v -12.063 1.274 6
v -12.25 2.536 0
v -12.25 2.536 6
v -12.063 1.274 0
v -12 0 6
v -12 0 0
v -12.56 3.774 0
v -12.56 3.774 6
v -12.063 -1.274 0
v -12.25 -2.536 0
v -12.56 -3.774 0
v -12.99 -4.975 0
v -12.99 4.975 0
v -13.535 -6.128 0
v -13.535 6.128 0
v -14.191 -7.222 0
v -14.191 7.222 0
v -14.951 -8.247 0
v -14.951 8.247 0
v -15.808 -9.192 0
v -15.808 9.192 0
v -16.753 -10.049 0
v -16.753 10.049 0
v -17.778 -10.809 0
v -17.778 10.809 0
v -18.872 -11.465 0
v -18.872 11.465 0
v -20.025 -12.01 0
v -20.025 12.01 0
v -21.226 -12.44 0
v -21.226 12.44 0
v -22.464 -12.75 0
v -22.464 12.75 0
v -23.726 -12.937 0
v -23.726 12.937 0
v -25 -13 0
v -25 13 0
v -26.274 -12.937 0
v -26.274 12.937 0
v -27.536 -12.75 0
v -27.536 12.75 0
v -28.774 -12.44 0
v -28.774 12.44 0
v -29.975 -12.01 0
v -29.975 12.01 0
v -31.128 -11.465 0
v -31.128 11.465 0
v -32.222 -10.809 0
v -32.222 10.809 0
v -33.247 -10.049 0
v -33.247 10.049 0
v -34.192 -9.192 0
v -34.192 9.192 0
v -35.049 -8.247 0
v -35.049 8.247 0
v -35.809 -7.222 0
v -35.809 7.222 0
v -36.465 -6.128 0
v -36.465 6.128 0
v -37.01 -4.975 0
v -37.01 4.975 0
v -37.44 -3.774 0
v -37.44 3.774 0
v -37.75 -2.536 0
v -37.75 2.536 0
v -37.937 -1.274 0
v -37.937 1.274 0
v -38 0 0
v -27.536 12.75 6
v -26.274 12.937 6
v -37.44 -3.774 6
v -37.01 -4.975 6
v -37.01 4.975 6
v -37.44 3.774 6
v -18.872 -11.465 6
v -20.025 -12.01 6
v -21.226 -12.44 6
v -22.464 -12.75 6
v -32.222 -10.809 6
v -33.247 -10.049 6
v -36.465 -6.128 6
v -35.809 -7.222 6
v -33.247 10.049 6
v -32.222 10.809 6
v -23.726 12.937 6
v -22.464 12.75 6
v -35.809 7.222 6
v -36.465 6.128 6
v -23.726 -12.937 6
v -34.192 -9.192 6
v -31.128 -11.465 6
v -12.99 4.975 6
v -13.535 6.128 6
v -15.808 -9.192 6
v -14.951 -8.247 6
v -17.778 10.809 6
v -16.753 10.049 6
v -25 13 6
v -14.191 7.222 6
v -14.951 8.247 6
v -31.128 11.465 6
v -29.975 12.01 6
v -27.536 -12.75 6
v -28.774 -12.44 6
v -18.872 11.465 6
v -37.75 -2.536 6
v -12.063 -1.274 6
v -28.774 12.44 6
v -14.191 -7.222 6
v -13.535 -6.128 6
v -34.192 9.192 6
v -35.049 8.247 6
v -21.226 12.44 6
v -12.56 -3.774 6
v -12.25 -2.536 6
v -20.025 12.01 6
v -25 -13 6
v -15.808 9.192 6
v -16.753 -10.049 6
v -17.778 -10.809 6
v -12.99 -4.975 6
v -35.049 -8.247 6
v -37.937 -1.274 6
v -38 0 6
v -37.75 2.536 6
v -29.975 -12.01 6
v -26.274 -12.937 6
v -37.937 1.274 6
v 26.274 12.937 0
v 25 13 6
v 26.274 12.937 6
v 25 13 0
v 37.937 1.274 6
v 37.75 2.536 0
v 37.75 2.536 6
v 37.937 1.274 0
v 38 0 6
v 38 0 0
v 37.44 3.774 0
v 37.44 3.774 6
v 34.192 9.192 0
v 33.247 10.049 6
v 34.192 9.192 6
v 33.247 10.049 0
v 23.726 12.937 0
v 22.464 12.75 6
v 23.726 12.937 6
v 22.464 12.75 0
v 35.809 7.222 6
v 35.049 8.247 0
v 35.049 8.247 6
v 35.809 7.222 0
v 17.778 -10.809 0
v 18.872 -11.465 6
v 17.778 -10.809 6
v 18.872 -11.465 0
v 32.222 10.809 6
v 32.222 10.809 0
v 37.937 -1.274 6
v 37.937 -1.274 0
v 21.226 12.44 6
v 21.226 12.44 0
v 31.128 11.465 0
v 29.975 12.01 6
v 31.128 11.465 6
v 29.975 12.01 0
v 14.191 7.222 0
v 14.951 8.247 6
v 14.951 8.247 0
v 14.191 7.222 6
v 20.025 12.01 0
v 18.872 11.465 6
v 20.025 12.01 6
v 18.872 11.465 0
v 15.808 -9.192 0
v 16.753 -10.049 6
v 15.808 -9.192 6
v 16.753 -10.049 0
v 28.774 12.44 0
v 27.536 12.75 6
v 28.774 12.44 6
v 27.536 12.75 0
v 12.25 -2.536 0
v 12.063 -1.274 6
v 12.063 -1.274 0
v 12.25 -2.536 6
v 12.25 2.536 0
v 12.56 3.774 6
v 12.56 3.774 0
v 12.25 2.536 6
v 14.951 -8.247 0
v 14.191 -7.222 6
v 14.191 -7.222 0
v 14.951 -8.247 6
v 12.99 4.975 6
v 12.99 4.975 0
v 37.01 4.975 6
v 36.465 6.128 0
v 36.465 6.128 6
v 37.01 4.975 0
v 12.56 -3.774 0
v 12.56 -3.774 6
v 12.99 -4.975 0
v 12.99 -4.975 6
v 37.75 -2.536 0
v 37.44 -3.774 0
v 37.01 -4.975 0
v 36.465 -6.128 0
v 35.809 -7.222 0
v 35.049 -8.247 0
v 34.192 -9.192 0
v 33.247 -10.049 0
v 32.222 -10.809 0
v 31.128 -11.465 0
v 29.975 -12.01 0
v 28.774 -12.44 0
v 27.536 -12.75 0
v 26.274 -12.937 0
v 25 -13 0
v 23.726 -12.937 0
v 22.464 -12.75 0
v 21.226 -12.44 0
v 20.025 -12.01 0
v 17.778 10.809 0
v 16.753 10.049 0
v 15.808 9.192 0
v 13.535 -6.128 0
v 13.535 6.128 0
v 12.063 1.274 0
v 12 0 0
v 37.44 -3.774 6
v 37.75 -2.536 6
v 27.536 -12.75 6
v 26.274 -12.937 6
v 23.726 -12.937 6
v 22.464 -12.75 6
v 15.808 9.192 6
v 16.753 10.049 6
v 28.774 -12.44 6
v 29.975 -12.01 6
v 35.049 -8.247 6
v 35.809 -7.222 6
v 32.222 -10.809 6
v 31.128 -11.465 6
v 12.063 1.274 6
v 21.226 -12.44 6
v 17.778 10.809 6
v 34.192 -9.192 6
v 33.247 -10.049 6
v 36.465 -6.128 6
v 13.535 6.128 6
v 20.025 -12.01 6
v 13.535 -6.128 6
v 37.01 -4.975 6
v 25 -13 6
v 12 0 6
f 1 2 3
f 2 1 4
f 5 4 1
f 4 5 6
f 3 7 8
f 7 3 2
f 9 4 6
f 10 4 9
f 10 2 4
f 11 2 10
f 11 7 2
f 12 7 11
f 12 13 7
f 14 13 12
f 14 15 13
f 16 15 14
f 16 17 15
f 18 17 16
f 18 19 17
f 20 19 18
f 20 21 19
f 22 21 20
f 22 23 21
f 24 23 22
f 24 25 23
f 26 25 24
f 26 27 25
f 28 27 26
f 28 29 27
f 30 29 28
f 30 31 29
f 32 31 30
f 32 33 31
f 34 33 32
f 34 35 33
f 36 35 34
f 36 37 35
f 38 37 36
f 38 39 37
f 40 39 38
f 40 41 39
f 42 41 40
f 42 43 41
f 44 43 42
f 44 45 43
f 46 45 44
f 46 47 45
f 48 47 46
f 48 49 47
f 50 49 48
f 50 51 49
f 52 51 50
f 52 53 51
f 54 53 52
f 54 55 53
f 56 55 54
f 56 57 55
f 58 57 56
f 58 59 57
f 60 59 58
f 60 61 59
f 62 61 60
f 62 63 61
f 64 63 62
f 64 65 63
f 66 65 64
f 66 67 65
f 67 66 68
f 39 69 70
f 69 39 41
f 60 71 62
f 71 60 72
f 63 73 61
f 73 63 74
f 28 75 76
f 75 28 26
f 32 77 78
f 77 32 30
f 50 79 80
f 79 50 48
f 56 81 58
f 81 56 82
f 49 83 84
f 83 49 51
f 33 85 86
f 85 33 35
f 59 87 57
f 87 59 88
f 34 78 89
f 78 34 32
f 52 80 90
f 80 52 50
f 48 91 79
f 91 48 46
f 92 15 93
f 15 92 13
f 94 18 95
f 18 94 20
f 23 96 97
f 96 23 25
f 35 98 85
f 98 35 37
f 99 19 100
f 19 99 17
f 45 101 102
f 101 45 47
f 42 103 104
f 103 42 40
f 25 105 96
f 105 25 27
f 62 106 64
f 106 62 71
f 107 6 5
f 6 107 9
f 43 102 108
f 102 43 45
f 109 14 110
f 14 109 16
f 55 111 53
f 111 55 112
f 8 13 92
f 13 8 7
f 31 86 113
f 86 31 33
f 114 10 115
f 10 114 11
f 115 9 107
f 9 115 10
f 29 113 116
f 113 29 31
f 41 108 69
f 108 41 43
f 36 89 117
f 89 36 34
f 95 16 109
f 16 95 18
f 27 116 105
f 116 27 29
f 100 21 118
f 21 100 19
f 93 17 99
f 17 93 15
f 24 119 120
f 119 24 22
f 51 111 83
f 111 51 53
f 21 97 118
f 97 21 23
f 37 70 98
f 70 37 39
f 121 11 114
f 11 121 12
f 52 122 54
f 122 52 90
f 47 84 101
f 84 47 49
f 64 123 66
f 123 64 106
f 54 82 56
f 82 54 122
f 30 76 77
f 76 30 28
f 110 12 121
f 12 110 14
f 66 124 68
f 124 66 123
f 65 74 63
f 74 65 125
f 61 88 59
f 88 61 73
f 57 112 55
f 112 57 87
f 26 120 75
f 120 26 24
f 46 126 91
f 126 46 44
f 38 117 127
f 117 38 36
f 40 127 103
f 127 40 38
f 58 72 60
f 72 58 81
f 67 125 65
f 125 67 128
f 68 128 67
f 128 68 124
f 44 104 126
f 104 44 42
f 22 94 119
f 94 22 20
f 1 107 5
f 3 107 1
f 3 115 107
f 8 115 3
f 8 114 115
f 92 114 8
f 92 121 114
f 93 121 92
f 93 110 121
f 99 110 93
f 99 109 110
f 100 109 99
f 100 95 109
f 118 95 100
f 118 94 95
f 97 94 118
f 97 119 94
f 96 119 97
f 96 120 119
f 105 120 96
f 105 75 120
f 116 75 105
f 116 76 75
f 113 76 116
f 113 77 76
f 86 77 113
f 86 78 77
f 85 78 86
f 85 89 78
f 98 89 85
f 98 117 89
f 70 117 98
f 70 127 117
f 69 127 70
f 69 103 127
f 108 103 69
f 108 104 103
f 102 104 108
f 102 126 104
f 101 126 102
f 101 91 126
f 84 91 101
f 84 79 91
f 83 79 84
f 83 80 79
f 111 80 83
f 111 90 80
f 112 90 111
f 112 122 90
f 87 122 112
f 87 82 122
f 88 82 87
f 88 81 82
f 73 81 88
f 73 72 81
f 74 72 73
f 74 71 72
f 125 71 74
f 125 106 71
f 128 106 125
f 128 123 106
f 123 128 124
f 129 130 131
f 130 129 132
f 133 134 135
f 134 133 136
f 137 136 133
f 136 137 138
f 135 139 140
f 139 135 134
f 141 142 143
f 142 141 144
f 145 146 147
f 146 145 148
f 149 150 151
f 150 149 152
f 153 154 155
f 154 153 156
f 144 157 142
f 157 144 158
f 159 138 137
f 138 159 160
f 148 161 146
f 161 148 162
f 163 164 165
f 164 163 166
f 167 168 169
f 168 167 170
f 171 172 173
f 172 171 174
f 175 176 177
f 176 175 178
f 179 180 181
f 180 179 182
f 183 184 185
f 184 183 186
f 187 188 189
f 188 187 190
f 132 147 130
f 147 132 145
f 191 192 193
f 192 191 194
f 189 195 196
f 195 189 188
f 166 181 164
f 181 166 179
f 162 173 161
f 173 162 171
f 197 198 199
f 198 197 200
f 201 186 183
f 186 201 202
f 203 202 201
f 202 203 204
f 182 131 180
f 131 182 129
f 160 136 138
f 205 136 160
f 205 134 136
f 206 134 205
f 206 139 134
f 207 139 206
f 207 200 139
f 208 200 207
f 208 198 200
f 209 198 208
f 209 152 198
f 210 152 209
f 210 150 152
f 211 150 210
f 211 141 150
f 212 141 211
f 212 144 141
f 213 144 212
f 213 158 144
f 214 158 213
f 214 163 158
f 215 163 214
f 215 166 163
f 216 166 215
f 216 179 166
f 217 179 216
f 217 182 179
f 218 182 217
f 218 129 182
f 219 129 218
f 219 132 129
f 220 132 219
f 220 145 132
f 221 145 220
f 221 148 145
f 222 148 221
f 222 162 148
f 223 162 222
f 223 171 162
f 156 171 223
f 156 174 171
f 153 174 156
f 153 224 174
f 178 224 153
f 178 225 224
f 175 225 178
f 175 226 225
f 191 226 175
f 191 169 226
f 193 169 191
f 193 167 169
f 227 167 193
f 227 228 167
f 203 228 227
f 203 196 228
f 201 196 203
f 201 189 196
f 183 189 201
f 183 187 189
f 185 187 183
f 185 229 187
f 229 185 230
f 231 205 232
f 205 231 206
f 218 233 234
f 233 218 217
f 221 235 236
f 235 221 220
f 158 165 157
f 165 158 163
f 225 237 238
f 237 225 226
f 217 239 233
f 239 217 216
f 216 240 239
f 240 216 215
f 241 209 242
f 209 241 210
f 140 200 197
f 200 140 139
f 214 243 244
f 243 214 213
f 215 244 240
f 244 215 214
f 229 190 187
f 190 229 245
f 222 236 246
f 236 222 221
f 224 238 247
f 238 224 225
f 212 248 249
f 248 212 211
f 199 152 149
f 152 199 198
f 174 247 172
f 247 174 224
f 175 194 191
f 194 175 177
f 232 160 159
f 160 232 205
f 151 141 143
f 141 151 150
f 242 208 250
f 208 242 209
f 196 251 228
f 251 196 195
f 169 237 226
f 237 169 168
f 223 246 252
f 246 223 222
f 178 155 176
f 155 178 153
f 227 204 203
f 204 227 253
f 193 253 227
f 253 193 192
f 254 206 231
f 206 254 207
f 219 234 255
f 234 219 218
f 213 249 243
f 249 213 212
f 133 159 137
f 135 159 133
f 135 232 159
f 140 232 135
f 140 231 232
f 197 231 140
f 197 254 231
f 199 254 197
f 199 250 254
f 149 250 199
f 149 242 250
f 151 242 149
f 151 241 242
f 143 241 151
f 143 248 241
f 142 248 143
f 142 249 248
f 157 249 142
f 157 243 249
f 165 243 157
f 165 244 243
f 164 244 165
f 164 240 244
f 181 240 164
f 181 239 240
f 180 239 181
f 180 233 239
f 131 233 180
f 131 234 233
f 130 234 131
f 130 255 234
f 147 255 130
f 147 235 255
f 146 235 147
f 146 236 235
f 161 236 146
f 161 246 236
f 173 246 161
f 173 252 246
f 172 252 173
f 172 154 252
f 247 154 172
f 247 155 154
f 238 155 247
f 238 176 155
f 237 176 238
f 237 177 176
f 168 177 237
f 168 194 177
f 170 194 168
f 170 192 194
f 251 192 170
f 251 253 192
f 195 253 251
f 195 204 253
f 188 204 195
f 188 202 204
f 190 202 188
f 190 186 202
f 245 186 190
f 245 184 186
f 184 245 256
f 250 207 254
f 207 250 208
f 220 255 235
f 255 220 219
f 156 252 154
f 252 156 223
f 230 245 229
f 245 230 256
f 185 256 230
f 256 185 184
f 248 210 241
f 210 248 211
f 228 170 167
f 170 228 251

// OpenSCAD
// Starter cylinders for task-032.
$fn = 64;

cylinder_radius = 13;
base_height = 6;
cylinder_spacing = 50;

union() {
  translate([-cylinder_spacing / 2, 0, 0])
    cylinder(h = base_height, r = cylinder_radius);
  translate([cylinder_spacing / 2, 0, 0])
    cylinder(h = base_height, r = cylinder_radius);
}
